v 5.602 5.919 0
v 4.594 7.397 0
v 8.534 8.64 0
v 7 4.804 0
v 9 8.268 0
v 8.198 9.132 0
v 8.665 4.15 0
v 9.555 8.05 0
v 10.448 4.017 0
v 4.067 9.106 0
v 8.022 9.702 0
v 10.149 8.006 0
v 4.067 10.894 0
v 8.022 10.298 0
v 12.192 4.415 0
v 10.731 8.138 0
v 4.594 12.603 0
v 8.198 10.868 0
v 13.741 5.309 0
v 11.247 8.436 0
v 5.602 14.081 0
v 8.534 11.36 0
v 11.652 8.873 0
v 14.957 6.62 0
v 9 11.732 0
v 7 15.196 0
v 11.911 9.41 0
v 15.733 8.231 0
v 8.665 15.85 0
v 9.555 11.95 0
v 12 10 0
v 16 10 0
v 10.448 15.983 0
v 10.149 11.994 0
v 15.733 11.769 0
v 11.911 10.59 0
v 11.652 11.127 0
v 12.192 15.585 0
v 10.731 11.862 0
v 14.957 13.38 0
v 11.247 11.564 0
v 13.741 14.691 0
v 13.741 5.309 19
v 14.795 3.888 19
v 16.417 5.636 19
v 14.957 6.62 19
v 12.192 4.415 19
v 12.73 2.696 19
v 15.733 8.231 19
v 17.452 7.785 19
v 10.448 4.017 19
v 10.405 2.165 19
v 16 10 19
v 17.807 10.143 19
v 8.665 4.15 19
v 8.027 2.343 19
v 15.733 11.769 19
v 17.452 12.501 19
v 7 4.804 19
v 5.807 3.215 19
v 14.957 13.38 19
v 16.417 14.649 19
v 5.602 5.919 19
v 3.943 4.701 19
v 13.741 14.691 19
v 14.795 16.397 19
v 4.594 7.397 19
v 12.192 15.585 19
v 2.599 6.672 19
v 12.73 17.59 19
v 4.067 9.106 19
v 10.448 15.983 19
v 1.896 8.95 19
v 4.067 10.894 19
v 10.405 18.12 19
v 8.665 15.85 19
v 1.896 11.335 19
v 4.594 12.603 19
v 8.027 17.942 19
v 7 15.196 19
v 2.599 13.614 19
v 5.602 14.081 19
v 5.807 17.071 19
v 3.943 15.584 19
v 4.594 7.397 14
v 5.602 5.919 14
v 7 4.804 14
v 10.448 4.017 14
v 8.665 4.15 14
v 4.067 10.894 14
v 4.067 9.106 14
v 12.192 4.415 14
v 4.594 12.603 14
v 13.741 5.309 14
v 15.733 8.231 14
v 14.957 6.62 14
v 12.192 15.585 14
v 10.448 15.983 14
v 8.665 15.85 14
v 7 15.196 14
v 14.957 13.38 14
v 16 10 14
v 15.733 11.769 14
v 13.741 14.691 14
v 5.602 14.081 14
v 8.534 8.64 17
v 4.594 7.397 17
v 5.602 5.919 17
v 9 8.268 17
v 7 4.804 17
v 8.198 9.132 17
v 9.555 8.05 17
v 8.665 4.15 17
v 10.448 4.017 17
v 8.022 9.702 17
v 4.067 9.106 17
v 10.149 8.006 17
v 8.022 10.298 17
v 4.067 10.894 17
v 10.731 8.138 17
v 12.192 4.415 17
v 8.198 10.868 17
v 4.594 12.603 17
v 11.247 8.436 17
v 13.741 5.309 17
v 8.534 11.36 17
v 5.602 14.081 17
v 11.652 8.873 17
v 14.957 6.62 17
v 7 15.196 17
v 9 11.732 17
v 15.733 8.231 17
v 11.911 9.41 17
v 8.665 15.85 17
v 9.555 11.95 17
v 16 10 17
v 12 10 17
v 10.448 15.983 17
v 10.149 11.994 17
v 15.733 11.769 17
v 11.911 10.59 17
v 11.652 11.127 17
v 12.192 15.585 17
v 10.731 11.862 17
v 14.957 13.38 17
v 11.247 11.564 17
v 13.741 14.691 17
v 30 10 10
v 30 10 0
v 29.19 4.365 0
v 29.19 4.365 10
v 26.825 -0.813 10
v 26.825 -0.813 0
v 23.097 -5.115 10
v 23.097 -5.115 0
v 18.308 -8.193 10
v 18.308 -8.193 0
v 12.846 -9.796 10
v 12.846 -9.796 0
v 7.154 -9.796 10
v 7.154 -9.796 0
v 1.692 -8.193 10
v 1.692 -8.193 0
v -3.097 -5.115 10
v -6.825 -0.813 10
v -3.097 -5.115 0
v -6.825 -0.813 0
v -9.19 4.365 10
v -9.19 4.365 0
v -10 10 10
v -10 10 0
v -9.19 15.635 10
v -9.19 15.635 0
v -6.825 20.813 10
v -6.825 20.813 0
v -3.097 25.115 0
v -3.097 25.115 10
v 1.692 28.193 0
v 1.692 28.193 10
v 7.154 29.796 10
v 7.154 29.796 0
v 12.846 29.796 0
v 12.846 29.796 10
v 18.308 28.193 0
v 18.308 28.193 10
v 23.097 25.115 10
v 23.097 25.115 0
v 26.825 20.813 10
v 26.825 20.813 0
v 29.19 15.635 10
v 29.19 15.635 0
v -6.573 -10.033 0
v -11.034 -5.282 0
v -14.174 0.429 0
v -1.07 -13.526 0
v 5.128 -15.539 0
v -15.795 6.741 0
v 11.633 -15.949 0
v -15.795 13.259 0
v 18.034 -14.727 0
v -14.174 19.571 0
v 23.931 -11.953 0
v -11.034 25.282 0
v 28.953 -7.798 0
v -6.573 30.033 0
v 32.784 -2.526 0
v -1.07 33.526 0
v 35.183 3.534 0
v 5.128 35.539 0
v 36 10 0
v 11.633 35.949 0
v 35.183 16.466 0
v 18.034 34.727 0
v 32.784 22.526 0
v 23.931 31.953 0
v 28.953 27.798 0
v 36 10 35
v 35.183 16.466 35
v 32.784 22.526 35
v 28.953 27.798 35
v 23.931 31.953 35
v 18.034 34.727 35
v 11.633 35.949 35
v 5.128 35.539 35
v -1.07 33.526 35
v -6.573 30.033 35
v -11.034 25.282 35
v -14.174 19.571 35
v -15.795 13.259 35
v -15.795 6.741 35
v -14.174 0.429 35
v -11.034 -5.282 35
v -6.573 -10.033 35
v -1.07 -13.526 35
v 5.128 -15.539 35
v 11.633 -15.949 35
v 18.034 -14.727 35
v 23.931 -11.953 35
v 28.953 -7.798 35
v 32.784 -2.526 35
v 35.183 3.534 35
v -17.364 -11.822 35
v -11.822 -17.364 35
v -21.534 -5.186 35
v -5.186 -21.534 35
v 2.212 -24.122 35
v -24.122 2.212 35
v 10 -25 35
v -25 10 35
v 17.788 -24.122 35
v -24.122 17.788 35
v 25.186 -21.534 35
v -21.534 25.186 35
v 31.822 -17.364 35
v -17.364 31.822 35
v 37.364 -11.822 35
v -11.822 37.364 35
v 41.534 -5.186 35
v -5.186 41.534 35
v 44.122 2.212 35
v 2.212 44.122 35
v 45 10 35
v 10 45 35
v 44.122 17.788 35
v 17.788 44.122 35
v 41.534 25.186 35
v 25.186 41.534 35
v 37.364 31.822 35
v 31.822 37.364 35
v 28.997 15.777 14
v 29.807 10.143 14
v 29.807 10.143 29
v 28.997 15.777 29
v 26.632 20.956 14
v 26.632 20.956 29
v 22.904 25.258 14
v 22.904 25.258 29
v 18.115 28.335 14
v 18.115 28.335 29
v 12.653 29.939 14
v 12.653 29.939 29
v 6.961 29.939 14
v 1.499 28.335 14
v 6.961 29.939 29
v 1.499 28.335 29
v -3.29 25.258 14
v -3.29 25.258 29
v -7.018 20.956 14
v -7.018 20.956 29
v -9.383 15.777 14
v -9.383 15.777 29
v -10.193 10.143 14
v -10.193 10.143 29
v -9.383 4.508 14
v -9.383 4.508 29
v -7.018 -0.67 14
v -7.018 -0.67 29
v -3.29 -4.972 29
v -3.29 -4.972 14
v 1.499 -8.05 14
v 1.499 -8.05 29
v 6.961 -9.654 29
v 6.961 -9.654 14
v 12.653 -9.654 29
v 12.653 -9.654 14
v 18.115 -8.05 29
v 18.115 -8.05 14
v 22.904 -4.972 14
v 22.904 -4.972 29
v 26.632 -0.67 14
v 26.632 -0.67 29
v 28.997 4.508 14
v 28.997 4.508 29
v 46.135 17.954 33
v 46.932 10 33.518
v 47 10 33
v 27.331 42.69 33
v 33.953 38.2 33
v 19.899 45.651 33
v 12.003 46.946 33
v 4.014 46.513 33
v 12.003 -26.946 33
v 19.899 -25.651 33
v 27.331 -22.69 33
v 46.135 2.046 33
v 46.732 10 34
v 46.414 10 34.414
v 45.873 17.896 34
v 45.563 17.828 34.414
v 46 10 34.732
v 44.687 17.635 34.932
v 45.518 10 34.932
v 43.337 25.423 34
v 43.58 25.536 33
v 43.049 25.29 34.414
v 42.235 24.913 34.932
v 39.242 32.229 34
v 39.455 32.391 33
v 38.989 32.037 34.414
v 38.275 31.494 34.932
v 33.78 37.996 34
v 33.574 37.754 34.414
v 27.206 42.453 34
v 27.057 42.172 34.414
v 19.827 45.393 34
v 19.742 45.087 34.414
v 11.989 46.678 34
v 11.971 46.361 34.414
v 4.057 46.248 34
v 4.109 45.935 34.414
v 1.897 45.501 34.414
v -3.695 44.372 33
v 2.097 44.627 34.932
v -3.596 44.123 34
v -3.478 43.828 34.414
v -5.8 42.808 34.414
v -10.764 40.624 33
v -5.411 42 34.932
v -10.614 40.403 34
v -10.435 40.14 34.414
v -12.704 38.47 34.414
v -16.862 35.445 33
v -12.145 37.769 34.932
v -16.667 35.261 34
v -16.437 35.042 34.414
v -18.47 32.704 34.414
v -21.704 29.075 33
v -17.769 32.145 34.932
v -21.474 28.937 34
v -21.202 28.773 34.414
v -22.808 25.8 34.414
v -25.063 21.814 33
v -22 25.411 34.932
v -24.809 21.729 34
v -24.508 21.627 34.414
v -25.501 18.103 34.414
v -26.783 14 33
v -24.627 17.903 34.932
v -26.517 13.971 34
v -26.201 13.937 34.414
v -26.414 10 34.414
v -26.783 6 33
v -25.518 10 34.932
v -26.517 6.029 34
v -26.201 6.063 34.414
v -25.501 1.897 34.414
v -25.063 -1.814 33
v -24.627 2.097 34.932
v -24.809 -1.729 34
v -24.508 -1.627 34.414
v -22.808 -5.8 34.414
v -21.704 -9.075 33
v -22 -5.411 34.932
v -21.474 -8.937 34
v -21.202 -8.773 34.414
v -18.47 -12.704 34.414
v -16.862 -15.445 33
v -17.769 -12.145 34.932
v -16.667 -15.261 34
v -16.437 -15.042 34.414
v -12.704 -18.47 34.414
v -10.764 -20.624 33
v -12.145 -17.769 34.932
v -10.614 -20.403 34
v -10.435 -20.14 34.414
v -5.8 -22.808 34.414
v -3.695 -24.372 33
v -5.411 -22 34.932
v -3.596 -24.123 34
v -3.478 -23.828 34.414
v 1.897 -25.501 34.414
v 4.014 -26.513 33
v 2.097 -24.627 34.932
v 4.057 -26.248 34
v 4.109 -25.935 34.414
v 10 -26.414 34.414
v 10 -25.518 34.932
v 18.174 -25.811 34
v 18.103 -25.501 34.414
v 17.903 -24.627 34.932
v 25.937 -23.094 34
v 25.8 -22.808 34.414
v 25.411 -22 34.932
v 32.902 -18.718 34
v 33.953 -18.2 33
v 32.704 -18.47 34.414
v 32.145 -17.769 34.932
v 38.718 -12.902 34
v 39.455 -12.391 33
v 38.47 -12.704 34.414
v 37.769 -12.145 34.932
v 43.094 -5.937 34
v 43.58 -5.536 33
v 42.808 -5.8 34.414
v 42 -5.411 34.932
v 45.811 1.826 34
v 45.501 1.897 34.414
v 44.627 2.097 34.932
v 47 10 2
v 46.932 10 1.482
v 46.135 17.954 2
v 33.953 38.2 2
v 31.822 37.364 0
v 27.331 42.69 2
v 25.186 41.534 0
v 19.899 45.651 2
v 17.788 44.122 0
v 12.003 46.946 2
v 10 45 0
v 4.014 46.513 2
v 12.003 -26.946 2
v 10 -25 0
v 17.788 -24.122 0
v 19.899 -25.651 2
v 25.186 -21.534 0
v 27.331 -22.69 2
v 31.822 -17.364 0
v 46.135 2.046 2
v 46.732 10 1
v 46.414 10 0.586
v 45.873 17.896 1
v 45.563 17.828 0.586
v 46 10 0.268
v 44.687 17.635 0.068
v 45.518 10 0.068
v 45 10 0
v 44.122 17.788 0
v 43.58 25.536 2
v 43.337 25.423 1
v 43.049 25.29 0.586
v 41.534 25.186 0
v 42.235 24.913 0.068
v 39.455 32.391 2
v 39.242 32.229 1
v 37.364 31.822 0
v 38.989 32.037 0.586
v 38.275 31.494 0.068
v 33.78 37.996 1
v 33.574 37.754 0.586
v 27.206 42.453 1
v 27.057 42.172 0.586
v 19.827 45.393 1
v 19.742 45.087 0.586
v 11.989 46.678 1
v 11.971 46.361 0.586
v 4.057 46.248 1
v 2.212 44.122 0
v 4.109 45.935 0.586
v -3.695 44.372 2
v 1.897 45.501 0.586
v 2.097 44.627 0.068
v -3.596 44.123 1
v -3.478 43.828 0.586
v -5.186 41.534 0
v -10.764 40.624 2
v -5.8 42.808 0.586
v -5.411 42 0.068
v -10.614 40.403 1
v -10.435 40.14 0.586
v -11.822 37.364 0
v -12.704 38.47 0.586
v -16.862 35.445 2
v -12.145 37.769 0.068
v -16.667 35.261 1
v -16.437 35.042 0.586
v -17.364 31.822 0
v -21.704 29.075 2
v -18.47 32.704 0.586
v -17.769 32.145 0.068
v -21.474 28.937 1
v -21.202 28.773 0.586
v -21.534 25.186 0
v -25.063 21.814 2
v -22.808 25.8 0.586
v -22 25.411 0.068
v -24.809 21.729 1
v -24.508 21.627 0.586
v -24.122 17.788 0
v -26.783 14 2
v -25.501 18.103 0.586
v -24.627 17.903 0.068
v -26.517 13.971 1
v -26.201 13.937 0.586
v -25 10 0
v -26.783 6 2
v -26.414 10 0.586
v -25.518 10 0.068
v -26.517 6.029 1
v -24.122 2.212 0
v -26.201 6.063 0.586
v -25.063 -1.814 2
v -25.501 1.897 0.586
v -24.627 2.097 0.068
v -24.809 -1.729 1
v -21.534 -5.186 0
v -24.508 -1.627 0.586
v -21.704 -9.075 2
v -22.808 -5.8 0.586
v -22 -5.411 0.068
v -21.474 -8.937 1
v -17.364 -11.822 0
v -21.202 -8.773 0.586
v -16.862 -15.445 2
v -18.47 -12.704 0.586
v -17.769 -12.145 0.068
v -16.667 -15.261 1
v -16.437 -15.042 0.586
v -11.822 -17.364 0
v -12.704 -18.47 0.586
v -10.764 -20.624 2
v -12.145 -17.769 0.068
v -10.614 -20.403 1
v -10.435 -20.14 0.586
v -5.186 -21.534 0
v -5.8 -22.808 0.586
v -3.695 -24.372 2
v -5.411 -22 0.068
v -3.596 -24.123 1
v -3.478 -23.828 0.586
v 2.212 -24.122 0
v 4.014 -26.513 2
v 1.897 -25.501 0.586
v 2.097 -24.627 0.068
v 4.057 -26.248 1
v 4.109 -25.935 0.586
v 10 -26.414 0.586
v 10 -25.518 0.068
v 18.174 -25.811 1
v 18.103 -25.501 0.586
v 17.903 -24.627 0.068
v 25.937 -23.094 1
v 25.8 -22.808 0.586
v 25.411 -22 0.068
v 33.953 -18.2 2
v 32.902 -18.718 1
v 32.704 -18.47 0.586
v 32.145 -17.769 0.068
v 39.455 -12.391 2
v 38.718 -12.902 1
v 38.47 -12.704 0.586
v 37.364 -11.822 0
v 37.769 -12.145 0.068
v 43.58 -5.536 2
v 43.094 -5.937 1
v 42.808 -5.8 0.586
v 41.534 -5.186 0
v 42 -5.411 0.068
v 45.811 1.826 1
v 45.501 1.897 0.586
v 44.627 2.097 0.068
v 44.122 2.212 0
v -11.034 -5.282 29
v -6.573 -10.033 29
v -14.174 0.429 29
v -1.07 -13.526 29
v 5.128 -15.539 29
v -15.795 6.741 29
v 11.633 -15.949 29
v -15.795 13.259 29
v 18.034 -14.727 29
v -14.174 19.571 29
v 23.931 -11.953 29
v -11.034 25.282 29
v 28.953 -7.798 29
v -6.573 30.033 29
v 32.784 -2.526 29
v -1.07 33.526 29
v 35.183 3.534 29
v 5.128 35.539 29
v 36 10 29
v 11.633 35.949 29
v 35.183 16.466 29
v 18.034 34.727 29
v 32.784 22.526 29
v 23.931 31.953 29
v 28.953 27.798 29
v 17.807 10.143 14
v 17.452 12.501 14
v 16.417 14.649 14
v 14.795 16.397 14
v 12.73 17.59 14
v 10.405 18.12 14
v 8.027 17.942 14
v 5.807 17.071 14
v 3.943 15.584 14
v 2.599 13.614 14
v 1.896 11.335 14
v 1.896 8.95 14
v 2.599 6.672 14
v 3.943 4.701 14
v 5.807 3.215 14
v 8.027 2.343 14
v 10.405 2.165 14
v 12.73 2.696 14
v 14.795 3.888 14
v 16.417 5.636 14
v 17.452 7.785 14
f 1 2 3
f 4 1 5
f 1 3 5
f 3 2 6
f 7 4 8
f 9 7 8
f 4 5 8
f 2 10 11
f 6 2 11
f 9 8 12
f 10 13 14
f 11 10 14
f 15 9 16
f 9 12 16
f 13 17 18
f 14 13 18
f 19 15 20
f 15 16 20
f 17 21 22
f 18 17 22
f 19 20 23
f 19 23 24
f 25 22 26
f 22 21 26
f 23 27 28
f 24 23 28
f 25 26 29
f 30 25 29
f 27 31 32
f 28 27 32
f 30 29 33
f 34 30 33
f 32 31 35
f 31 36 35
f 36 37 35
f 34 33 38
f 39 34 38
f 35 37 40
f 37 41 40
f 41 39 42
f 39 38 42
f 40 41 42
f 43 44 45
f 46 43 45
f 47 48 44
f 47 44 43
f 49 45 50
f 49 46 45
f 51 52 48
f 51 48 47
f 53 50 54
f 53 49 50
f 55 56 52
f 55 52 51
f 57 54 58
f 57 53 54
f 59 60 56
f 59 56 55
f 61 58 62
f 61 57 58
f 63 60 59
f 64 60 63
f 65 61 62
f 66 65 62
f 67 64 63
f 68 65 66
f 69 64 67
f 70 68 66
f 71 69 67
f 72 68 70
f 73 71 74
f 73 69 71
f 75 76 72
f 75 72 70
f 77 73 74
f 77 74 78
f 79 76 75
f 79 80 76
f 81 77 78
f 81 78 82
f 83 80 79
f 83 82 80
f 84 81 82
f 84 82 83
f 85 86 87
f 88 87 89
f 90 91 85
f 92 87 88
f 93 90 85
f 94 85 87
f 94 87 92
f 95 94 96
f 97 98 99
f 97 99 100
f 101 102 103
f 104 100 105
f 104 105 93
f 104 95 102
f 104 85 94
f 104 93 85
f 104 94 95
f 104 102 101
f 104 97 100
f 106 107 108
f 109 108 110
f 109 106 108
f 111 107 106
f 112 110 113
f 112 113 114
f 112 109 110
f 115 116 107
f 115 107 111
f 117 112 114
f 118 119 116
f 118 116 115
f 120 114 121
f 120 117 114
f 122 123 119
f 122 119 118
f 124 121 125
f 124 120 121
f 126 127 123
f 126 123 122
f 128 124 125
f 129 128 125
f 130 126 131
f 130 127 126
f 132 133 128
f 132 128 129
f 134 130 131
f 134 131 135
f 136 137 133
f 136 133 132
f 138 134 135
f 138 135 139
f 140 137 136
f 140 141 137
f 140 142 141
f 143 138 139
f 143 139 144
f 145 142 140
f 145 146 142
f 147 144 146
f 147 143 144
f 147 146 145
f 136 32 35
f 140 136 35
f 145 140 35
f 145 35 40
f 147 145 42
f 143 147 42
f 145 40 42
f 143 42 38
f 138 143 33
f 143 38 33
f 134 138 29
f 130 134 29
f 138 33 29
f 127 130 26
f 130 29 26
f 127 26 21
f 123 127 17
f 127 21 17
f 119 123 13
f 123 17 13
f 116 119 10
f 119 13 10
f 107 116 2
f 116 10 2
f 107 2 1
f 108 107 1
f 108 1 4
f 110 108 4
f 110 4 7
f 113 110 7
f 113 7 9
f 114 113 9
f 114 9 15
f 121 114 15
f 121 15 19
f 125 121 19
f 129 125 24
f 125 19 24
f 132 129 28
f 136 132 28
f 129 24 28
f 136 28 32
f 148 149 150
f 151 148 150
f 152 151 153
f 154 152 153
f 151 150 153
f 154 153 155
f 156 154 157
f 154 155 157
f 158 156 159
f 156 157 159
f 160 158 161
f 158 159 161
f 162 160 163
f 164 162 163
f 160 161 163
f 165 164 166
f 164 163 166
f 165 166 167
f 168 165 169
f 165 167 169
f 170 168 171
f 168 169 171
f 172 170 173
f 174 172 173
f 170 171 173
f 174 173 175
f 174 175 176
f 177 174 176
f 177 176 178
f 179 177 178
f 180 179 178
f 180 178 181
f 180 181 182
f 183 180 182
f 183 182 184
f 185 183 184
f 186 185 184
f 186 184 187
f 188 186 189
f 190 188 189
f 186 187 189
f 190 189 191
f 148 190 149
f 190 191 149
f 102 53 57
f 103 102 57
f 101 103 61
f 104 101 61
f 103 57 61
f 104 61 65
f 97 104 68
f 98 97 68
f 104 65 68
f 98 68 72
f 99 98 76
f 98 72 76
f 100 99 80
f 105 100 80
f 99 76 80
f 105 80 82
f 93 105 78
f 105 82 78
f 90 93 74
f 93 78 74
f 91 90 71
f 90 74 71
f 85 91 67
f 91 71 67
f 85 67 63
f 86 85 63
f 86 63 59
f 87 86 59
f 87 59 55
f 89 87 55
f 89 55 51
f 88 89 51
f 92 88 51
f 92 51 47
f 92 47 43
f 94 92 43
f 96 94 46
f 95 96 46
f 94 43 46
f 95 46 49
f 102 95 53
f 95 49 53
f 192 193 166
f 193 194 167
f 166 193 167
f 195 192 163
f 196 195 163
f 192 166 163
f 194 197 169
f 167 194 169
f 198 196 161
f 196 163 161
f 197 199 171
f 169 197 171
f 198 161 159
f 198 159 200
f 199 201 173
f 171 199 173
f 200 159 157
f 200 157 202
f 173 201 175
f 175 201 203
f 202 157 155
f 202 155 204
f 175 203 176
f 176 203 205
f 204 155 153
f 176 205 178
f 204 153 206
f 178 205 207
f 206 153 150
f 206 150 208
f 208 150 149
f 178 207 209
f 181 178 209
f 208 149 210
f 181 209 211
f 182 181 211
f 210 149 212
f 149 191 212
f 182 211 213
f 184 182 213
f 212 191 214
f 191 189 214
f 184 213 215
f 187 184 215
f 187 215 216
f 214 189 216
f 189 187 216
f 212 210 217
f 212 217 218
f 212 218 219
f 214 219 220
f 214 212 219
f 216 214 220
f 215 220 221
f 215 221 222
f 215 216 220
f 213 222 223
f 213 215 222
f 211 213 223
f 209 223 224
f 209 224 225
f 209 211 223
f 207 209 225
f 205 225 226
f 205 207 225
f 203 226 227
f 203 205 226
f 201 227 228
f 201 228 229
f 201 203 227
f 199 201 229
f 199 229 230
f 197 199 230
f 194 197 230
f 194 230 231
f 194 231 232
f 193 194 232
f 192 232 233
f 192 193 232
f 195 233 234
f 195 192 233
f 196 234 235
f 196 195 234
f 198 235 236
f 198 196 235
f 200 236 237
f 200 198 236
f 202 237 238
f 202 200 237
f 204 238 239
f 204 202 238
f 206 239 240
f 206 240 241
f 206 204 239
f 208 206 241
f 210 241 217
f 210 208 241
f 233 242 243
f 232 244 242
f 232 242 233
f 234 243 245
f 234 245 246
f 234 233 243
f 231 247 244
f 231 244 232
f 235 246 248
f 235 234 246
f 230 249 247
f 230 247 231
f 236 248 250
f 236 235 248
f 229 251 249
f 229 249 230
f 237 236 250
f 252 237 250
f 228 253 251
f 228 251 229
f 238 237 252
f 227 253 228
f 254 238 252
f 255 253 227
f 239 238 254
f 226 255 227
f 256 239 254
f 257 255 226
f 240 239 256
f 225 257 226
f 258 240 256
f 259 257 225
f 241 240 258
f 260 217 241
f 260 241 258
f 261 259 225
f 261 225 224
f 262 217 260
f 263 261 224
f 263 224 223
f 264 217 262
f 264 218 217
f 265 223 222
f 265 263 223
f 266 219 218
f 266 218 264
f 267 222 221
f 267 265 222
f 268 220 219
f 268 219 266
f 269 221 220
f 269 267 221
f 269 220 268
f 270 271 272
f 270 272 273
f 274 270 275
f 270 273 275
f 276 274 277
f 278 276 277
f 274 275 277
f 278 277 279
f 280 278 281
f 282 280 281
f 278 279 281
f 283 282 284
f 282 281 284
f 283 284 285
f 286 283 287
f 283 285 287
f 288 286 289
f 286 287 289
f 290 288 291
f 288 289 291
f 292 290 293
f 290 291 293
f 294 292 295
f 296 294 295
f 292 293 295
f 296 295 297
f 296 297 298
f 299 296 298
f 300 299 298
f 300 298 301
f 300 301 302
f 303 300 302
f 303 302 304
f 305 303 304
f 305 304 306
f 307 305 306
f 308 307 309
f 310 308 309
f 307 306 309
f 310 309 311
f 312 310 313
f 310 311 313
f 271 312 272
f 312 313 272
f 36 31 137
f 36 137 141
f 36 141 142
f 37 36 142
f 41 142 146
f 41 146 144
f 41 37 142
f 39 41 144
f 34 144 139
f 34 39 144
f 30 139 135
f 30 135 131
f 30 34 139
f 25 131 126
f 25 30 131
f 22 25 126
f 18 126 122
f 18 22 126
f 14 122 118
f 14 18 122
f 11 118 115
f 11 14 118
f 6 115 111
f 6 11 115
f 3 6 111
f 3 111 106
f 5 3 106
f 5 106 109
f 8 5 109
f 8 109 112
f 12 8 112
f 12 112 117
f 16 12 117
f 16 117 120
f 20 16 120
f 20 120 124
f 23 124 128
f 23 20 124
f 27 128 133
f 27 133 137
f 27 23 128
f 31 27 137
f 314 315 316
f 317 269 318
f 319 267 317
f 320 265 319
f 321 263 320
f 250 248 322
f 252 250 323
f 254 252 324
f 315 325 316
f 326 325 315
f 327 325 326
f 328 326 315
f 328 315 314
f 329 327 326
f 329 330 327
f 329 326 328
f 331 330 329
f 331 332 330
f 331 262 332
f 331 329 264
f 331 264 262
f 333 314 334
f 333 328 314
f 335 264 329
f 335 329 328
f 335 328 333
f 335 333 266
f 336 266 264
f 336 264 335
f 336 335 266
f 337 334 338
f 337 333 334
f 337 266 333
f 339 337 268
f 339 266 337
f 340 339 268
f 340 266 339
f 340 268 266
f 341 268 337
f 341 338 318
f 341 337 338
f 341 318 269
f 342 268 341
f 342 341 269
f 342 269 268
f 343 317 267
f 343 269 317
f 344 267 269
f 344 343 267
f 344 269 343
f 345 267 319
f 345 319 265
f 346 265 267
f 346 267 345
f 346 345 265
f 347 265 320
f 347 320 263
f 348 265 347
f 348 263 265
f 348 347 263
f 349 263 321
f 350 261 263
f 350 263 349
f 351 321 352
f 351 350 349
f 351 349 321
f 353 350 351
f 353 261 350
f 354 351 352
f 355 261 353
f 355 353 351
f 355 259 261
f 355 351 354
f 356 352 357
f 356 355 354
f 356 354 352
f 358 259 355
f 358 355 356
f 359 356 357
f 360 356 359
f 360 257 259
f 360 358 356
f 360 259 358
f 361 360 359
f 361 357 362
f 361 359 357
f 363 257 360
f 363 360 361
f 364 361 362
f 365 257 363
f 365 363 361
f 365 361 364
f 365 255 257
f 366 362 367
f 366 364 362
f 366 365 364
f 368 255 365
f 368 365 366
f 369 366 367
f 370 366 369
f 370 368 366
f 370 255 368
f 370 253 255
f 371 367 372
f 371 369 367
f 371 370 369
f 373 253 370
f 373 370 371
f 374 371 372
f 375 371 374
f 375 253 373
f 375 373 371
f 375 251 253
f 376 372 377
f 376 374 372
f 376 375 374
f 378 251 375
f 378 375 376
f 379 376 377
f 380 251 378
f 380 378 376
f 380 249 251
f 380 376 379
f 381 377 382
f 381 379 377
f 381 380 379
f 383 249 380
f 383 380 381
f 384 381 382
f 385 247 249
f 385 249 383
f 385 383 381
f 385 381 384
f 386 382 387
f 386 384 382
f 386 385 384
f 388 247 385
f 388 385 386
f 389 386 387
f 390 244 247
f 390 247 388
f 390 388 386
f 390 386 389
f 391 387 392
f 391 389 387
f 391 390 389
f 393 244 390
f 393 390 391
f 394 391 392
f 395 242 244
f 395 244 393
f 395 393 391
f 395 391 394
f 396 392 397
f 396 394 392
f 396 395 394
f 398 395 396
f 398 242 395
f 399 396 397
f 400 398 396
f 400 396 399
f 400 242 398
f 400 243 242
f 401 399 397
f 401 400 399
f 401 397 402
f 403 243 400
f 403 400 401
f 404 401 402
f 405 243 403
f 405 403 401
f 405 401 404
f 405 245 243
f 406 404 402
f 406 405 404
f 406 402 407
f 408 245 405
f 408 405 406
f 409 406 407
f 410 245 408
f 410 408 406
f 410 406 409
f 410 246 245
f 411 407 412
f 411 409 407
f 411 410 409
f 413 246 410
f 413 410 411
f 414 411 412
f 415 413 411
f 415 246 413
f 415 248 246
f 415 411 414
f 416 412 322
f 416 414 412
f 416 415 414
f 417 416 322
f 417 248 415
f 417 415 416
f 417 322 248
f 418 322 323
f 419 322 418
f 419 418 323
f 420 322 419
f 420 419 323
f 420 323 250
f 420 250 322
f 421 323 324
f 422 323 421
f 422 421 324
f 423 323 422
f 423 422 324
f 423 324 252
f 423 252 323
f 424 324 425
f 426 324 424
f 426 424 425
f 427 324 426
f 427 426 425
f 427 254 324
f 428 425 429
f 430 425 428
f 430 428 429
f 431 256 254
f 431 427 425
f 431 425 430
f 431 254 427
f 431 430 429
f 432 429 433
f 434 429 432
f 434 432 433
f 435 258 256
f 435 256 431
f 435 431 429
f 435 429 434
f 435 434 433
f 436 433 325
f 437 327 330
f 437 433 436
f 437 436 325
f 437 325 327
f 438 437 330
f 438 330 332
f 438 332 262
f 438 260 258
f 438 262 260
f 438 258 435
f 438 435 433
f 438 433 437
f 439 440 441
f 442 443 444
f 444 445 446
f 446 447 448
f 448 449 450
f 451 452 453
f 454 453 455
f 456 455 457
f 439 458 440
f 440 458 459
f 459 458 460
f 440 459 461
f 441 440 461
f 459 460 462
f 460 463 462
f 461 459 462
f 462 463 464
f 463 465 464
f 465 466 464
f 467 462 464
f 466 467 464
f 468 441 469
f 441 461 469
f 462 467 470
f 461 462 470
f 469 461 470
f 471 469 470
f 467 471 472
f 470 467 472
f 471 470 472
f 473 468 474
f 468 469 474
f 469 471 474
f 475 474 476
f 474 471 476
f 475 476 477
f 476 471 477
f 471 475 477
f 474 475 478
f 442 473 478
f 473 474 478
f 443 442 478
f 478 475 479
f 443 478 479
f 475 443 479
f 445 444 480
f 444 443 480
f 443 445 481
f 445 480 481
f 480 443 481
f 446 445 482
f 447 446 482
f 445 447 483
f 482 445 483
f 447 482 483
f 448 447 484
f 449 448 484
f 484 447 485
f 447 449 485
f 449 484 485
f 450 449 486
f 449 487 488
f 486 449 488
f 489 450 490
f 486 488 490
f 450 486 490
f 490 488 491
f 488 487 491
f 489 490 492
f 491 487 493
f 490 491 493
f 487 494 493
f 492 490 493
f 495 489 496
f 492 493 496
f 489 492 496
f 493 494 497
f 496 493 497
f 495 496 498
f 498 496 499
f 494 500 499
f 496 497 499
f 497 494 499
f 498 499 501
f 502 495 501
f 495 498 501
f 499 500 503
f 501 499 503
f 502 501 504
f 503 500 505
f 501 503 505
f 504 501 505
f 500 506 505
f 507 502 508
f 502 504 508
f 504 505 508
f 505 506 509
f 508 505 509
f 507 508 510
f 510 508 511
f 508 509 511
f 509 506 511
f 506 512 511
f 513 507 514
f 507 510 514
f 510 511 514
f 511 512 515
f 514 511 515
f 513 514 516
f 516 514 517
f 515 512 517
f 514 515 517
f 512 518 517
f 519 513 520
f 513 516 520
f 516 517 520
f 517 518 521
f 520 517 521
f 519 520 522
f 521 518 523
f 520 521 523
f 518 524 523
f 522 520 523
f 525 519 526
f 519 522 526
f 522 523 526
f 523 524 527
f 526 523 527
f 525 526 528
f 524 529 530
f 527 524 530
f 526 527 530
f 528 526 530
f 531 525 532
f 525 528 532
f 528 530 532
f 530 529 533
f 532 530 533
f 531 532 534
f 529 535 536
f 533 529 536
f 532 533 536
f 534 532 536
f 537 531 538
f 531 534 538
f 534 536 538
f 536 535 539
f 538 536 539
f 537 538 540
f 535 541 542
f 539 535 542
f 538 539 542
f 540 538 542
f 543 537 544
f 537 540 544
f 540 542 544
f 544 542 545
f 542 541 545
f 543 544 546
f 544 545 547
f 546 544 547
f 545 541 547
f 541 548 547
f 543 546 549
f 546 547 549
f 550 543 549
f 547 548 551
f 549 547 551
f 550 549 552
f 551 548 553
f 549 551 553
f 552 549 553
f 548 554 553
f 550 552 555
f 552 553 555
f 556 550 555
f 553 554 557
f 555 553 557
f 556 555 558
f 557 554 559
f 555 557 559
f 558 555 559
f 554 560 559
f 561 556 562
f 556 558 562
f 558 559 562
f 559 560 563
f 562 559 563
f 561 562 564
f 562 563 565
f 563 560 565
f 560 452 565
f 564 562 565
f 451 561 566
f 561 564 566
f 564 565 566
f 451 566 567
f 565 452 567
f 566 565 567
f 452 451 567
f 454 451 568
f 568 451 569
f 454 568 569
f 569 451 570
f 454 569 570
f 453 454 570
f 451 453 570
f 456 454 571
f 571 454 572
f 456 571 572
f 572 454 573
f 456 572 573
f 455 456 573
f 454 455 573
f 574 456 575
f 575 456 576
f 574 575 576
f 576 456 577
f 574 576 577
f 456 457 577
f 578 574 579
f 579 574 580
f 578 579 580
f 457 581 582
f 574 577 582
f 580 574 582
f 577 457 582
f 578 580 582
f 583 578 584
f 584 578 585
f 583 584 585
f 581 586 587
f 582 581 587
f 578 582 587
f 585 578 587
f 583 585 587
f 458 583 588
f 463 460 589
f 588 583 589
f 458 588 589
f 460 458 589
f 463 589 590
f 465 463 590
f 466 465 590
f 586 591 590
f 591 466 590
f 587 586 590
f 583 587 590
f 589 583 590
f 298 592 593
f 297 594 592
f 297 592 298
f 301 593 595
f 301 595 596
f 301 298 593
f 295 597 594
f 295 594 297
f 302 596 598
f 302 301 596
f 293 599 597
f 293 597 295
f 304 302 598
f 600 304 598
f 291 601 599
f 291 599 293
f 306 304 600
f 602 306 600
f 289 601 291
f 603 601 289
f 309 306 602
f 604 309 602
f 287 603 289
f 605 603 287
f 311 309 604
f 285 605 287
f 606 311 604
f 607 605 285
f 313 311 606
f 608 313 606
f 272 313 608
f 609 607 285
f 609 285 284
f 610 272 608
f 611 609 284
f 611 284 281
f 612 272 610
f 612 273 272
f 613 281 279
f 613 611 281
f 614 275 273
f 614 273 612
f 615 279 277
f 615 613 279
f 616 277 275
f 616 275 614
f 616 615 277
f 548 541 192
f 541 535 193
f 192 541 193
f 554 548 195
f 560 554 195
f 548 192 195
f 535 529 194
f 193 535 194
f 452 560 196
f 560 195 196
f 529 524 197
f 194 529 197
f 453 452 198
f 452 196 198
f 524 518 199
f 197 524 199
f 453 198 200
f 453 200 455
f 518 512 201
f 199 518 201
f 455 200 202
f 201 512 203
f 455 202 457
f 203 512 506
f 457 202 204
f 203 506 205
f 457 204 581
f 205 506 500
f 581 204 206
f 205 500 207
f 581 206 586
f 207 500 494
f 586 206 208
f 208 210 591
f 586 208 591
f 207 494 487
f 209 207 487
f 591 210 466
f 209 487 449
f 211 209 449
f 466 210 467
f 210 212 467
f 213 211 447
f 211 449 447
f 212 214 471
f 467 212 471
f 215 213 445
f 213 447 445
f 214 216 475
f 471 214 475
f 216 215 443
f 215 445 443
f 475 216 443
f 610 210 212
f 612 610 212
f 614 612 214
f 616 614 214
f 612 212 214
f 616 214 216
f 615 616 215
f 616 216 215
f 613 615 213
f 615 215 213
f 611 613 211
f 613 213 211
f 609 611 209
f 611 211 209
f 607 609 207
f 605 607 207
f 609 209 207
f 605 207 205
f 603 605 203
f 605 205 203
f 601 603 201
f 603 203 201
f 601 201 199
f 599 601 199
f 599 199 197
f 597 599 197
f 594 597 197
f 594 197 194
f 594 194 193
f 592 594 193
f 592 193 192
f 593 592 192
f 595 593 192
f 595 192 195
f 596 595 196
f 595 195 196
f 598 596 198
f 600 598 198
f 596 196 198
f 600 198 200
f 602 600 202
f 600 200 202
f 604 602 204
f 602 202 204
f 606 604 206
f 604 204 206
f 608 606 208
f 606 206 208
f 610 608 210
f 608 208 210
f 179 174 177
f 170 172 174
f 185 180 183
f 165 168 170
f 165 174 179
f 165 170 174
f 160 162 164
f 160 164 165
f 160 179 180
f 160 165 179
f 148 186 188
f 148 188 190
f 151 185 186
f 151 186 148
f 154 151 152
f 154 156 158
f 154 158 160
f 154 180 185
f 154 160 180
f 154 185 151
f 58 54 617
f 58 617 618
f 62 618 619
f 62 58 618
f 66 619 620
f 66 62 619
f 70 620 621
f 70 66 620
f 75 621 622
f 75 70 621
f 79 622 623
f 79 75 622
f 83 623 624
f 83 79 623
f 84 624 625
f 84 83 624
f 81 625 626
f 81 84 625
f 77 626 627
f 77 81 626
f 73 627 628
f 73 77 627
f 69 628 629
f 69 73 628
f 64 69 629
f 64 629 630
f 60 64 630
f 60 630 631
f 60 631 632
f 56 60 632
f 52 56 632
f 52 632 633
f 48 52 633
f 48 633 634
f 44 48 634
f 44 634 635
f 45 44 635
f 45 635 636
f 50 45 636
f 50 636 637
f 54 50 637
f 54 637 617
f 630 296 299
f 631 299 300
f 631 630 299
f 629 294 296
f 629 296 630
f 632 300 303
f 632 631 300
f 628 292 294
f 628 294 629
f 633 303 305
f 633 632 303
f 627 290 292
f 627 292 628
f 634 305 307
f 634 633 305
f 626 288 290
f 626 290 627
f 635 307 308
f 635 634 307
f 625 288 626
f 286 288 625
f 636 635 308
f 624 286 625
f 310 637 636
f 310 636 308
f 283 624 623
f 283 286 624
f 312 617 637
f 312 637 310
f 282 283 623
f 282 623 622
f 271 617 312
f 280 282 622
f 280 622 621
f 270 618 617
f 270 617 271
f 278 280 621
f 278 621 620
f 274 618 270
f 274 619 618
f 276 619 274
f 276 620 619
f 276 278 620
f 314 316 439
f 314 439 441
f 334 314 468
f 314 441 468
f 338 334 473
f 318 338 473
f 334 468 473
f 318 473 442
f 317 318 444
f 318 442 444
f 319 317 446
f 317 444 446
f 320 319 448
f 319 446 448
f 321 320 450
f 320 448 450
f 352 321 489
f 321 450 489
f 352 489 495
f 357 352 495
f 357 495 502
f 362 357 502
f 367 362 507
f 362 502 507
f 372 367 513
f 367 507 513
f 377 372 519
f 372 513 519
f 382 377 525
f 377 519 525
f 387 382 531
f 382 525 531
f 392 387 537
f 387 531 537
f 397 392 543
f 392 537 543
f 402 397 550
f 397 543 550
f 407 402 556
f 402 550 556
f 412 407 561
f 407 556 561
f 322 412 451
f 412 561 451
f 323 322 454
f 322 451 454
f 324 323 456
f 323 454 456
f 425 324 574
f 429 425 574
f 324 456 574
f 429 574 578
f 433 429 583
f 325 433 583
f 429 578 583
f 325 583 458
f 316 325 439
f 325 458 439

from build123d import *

# Parameters (mm, degrees)
SKETCH_R          = 37
SKETCH_R_2        = 26
PAD_DEPTH         = 35
FILLET_R          = 2
SKETCH001_R       = 26
PAD001_DEPTH      = 29
SKETCH002_R       = 20
SKETCH002_R_2     = 8
POCKET_DEPTH      = 15
SKETCH003_R       = 20
POCKET001_DEPTH   = 10
POCKET001_FACE9_R = 8
POCKET002_DEPTH   = 10
SKETCH004_R       = 6
POCKET003_DEPTH   = 5
SKETCH005_R       = 6
SKETCH005_R_2     = 2
PAD002_DEPTH      = 17


with BuildPart() as outer_rubber:
    # Sketch → Pad (new body)
    with BuildSketch(Plane.XY):
        with Locations((10, 10)):
            Circle(SKETCH_R)
        with Locations((10, 10)):
            Circle(SKETCH_R_2, mode=Mode.SUBTRACT)
    extrude(amount=PAD_DEPTH)

    # Fillet
    fillet_edges = [outer_rubber.edges().sort_by_distance(p)[0] for p in [
        (-27, 10, 35),
        (-27, 10, 0),
    ]]
    fillet(fillet_edges, radius=FILLET_R)


with BuildPart() as rim:
    # Sketch001 → Pad001 (new body)
    with BuildSketch(Plane.XY):
        with Locations((10, 10)):
            Circle(SKETCH001_R)
    extrude(amount=PAD001_DEPTH)

    # Sketch002 (on Face3 of Pad001) → Pocket (cut)
    with BuildSketch(Plane.XY.offset(29)):
        with Locations((9.806965, 10.142783)):
            Circle(SKETCH002_R)
        with Locations((9.806965, 10.142783)):
            Circle(SKETCH002_R_2, mode=Mode.SUBTRACT)
    extrude(amount=-POCKET_DEPTH, mode=Mode.SUBTRACT)

    # Sketch003 (on Face2 of Pocket) → Pocket001 (cut)
    with BuildSketch(Plane(origin=(0, 0, 0), x_dir=(1, 0, 0), z_dir=(0, 0, -1))):
        with Locations((10, -10)):
            Circle(SKETCH003_R)
    extrude(amount=-POCKET001_DEPTH, mode=Mode.SUBTRACT)

    # Pocket001 Face9 → Pocket002 (cut)
    with BuildSketch(Plane(origin=(9.806965, 10.142783, 29), x_dir=(0, 1, 0), z_dir=(0, 0, 1))):
        Circle(POCKET001_FACE9_R)
    extrude(amount=-POCKET002_DEPTH, mode=Mode.SUBTRACT)

    # Sketch004 (on Face9 of Pocket002) → Pocket003 (cut)
    with BuildSketch(Plane.XY.offset(19)):
        with Locations((10, 10)):
            Circle(SKETCH004_R)
    extrude(amount=-POCKET003_DEPTH, mode=Mode.SUBTRACT)


with BuildPart() as coupler:
    # Sketch005 → Pad002 (new body)
    with BuildSketch(Plane.XY):
        with Locations((10, 10)):
            Circle(SKETCH005_R)
        with Locations((10, 10)):
            Circle(SKETCH005_R_2, mode=Mode.SUBTRACT)
    extrude(amount=PAD002_DEPTH)


solid = Compound([outer_rubber.part, rim.part, coupler.part])
